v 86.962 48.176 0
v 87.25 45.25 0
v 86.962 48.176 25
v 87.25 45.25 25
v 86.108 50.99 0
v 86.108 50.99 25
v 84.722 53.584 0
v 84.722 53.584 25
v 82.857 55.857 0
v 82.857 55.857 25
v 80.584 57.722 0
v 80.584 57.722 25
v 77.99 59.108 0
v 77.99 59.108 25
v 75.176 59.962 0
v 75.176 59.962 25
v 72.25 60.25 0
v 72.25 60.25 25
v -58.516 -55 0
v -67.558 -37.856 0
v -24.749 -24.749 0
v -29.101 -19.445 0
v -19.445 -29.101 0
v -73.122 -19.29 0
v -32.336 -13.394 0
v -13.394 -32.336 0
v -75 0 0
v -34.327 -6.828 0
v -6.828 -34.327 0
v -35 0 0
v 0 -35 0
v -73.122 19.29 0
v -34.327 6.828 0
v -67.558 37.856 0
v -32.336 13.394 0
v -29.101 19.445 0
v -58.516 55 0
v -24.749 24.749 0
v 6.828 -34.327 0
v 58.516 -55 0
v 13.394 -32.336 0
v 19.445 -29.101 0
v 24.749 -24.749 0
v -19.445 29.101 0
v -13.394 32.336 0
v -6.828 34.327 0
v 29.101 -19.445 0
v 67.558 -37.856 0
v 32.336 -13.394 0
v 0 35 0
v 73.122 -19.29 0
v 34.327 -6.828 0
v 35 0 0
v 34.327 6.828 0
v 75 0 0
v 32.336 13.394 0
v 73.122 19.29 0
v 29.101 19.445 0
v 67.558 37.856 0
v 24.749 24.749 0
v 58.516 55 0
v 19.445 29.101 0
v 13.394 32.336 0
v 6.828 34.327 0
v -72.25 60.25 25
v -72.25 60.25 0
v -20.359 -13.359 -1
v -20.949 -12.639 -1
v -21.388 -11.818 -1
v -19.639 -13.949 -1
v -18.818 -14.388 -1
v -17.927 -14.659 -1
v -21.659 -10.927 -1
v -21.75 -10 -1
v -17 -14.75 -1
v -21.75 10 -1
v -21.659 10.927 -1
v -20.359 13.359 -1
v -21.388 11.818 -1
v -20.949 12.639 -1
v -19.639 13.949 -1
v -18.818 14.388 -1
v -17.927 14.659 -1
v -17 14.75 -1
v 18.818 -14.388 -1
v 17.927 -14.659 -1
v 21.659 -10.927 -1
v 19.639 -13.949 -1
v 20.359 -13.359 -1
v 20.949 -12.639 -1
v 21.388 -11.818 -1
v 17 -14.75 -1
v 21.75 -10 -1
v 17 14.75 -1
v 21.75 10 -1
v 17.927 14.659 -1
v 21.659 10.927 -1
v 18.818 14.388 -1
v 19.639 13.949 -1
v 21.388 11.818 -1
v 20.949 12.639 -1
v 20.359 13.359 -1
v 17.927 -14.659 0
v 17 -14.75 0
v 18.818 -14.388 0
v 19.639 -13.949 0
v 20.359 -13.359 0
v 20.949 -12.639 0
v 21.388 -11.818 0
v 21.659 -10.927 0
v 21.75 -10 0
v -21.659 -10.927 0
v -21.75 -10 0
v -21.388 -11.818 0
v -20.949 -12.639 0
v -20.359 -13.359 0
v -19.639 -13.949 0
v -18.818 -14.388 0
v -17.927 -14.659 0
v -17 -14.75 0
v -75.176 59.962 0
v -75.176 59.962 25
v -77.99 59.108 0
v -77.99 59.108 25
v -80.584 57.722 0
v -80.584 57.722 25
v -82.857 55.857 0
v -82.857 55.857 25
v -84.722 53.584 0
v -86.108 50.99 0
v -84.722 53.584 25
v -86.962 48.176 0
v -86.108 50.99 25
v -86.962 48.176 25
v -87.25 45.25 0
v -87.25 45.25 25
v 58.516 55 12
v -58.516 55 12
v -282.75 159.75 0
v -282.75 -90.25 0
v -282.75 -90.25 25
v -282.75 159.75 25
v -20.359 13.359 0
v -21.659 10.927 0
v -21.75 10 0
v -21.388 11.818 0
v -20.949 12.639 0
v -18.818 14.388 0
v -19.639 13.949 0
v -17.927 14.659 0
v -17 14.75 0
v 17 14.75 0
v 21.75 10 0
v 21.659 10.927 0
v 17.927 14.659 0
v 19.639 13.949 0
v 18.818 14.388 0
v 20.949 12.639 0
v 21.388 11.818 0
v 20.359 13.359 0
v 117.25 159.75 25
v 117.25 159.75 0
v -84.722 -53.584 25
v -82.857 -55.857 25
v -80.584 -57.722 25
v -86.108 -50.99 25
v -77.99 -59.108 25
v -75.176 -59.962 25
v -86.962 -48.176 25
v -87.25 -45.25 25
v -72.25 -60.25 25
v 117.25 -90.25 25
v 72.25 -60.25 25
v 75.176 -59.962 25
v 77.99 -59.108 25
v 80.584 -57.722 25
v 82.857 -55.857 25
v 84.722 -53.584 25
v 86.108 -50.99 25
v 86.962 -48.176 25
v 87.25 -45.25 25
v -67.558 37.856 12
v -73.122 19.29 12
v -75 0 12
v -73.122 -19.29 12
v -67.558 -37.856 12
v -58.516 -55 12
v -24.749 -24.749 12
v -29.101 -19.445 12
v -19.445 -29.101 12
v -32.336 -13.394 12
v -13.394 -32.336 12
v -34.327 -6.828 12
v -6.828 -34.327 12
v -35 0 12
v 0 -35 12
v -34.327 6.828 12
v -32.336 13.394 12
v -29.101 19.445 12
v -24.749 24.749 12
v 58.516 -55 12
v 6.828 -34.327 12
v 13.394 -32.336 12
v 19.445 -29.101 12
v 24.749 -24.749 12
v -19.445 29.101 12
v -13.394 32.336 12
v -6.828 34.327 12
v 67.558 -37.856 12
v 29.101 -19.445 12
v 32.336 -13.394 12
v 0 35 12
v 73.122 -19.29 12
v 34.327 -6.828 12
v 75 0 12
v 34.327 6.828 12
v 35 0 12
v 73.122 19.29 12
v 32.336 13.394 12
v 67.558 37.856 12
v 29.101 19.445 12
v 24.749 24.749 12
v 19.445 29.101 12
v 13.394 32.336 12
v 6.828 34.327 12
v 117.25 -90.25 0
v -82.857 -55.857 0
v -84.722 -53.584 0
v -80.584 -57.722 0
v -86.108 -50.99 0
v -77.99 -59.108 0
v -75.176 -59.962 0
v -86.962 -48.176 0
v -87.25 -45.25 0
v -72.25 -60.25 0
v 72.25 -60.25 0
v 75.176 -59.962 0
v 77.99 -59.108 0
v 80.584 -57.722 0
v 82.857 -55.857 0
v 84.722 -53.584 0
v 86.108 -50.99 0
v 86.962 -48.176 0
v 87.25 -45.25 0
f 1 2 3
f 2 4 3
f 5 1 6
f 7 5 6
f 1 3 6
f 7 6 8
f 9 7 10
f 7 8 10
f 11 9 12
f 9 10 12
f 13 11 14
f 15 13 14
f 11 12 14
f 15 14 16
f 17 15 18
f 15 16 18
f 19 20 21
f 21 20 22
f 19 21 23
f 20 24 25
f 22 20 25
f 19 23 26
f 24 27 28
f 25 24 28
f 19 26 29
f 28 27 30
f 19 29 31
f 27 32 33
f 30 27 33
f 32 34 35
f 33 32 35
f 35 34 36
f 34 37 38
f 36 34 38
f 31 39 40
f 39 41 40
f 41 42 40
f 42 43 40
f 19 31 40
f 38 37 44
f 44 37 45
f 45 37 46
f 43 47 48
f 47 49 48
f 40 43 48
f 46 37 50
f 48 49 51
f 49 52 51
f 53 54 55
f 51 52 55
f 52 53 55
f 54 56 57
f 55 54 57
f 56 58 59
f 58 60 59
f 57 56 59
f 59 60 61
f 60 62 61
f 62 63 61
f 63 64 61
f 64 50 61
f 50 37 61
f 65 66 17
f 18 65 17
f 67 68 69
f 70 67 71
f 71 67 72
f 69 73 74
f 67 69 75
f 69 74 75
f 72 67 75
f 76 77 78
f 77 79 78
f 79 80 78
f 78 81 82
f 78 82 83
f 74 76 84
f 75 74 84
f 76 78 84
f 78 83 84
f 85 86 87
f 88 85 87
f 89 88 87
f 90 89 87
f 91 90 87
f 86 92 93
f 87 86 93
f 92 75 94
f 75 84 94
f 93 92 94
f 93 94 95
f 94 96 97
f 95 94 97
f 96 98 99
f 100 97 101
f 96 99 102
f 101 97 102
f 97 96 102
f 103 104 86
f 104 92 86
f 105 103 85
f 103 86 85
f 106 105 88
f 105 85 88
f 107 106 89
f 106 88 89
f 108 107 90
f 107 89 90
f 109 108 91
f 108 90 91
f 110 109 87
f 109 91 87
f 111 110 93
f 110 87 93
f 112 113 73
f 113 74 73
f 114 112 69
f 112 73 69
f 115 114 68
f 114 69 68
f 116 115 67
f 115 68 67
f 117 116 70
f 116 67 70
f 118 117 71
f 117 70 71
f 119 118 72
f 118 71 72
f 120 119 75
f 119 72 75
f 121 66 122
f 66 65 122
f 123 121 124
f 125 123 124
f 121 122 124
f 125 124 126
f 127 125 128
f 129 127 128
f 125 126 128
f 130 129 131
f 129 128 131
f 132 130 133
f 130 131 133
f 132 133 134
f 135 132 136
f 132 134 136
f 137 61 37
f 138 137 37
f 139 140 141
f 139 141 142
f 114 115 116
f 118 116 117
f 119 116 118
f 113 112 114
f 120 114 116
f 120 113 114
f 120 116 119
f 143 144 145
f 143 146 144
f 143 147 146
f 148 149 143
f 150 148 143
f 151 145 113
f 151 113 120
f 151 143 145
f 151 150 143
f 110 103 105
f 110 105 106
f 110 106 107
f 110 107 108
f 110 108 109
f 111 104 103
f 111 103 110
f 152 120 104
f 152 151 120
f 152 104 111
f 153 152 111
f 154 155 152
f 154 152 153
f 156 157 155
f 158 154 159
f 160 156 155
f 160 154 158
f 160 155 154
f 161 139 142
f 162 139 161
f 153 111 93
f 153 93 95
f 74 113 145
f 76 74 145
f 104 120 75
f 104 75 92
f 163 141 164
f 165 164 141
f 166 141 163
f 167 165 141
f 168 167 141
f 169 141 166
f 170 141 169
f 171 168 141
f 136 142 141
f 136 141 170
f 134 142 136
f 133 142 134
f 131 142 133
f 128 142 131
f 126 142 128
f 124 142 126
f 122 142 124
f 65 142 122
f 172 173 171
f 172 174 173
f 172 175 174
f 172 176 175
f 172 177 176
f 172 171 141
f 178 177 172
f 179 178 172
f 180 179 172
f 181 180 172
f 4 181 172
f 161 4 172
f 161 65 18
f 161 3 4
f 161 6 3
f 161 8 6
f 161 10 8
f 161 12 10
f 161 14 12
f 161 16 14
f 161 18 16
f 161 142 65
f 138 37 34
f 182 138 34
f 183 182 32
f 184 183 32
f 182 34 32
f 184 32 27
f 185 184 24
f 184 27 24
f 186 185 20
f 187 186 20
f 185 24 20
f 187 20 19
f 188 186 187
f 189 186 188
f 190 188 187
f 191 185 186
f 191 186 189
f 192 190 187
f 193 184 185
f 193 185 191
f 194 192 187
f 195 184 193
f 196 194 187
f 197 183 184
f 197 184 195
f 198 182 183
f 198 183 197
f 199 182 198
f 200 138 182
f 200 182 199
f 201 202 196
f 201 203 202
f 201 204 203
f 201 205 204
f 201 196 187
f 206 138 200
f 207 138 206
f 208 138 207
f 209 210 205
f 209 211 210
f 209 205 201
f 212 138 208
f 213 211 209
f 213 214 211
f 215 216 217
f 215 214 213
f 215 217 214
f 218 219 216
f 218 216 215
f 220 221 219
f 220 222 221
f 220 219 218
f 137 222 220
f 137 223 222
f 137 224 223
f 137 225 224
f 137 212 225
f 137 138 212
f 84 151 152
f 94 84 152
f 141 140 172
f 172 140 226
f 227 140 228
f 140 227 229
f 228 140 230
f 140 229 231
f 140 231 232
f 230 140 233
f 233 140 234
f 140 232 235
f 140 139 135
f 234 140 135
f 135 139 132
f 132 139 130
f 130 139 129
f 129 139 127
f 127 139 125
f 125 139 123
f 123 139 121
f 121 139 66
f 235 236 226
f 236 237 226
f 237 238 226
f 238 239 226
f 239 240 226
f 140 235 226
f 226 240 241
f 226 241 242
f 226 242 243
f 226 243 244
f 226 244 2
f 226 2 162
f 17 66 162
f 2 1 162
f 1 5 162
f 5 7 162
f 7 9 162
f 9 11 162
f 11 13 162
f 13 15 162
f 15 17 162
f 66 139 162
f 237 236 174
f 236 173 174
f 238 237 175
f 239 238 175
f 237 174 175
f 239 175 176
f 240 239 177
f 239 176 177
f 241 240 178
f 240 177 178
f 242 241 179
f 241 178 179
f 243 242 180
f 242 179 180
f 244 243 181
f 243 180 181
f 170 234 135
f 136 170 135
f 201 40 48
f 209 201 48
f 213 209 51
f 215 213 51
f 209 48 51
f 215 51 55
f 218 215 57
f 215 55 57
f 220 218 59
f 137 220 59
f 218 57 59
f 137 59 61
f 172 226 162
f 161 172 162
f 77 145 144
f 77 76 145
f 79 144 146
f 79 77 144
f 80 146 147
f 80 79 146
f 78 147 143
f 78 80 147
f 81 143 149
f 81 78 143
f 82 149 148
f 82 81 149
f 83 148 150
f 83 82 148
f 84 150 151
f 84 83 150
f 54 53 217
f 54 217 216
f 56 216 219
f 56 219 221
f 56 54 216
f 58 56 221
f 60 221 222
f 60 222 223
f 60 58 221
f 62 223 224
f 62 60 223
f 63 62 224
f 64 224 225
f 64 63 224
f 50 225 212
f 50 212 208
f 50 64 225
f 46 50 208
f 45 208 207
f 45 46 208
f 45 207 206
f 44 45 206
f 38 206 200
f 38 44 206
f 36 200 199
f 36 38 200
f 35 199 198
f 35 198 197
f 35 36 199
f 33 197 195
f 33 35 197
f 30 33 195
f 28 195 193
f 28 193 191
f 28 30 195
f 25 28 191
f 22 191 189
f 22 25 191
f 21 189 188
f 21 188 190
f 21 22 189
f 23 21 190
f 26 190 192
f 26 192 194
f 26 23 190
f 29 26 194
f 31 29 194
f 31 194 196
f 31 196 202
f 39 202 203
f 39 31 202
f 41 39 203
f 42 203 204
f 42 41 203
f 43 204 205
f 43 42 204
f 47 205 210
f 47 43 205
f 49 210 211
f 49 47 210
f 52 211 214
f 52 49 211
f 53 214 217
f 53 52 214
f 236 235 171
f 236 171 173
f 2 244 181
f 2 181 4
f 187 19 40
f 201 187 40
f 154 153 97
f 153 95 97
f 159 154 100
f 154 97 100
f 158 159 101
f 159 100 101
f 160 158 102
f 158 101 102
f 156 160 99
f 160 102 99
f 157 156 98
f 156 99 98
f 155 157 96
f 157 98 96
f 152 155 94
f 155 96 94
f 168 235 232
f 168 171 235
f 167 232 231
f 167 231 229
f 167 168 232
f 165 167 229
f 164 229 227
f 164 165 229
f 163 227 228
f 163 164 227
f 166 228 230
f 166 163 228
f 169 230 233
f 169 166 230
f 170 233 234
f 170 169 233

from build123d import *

# Parameters (mm, degrees)
F1_W     = 400
F1_H     = 250
F1_W_2   = 174.5
F1_H_2   = 120.5
F2_DEPTH = 25
F1_R     = 35
F3_DEPTH = 12
F1_W_3   = 43.5
F1_H_3   = 29.5
F4_DEPTH = 1
F5_R     = 4.75
F6_R     = 15


# Not quite as in the source:
# - a feature names something its author has since deleted; it is built from what else it names


with BuildPart() as f2:
    # F1 (on Top) → F2 (new body)
    with BuildSketch(Plane.XY):
        with Locations((-82.75, 34.75)):
            Rectangle(F1_W, F1_H)
        Rectangle(F1_W_2, F1_H_2, mode=Mode.SUBTRACT)
    extrude(amount=F2_DEPTH)

    # F6
    f6_edges = [f2.edges().sort_by_distance(p)[0] for p in [
        (87.25, -60.25, 12.5),
        (87.25, 60.25, 12.5),
        (-87.25, 60.25, 12.5),
        (-87.25, -60.25, 12.5),
    ]]
    fillet(f6_edges, radius=F6_R)


with BuildPart() as f3:
    # F1 (on Top) → F3 (new body)
    with BuildSketch(Plane.XY):
        with BuildLine():
            Line((58.5164654425, 55), (-58.5164654425, 55))
            ThreePointArc((-58.5164654425, 55), (-75, 0), (-58.5164654425, -55))
            Line((-58.5164654425, -55), (58.5164654425, -55))
            ThreePointArc((58.5164654425, -55), (75, 0), (58.5164654425, 55))
        make_face()
        Circle(F1_R, mode=Mode.SUBTRACT)
    extrude(amount=F3_DEPTH)


with BuildPart() as f4:
    # F1 (on Top) → F4 (new body)
    with BuildSketch(Plane.XY):
        Rectangle(F1_W_3, F1_H_3)
    extrude(amount=-F4_DEPTH)

    # F5
    f5_edges = [f4.edges().sort_by_distance(p)[0] for p in [
        (21.75, -14.75, -0.5),
        (21.75, 14.75, -0.5),
        (-21.75, -14.75, -0.5),
        (-21.75, 14.75, -0.5),
    ]]
    fillet(f5_edges, radius=F5_R)


solid = Compound([f2.part, f3.part, f4.part])
